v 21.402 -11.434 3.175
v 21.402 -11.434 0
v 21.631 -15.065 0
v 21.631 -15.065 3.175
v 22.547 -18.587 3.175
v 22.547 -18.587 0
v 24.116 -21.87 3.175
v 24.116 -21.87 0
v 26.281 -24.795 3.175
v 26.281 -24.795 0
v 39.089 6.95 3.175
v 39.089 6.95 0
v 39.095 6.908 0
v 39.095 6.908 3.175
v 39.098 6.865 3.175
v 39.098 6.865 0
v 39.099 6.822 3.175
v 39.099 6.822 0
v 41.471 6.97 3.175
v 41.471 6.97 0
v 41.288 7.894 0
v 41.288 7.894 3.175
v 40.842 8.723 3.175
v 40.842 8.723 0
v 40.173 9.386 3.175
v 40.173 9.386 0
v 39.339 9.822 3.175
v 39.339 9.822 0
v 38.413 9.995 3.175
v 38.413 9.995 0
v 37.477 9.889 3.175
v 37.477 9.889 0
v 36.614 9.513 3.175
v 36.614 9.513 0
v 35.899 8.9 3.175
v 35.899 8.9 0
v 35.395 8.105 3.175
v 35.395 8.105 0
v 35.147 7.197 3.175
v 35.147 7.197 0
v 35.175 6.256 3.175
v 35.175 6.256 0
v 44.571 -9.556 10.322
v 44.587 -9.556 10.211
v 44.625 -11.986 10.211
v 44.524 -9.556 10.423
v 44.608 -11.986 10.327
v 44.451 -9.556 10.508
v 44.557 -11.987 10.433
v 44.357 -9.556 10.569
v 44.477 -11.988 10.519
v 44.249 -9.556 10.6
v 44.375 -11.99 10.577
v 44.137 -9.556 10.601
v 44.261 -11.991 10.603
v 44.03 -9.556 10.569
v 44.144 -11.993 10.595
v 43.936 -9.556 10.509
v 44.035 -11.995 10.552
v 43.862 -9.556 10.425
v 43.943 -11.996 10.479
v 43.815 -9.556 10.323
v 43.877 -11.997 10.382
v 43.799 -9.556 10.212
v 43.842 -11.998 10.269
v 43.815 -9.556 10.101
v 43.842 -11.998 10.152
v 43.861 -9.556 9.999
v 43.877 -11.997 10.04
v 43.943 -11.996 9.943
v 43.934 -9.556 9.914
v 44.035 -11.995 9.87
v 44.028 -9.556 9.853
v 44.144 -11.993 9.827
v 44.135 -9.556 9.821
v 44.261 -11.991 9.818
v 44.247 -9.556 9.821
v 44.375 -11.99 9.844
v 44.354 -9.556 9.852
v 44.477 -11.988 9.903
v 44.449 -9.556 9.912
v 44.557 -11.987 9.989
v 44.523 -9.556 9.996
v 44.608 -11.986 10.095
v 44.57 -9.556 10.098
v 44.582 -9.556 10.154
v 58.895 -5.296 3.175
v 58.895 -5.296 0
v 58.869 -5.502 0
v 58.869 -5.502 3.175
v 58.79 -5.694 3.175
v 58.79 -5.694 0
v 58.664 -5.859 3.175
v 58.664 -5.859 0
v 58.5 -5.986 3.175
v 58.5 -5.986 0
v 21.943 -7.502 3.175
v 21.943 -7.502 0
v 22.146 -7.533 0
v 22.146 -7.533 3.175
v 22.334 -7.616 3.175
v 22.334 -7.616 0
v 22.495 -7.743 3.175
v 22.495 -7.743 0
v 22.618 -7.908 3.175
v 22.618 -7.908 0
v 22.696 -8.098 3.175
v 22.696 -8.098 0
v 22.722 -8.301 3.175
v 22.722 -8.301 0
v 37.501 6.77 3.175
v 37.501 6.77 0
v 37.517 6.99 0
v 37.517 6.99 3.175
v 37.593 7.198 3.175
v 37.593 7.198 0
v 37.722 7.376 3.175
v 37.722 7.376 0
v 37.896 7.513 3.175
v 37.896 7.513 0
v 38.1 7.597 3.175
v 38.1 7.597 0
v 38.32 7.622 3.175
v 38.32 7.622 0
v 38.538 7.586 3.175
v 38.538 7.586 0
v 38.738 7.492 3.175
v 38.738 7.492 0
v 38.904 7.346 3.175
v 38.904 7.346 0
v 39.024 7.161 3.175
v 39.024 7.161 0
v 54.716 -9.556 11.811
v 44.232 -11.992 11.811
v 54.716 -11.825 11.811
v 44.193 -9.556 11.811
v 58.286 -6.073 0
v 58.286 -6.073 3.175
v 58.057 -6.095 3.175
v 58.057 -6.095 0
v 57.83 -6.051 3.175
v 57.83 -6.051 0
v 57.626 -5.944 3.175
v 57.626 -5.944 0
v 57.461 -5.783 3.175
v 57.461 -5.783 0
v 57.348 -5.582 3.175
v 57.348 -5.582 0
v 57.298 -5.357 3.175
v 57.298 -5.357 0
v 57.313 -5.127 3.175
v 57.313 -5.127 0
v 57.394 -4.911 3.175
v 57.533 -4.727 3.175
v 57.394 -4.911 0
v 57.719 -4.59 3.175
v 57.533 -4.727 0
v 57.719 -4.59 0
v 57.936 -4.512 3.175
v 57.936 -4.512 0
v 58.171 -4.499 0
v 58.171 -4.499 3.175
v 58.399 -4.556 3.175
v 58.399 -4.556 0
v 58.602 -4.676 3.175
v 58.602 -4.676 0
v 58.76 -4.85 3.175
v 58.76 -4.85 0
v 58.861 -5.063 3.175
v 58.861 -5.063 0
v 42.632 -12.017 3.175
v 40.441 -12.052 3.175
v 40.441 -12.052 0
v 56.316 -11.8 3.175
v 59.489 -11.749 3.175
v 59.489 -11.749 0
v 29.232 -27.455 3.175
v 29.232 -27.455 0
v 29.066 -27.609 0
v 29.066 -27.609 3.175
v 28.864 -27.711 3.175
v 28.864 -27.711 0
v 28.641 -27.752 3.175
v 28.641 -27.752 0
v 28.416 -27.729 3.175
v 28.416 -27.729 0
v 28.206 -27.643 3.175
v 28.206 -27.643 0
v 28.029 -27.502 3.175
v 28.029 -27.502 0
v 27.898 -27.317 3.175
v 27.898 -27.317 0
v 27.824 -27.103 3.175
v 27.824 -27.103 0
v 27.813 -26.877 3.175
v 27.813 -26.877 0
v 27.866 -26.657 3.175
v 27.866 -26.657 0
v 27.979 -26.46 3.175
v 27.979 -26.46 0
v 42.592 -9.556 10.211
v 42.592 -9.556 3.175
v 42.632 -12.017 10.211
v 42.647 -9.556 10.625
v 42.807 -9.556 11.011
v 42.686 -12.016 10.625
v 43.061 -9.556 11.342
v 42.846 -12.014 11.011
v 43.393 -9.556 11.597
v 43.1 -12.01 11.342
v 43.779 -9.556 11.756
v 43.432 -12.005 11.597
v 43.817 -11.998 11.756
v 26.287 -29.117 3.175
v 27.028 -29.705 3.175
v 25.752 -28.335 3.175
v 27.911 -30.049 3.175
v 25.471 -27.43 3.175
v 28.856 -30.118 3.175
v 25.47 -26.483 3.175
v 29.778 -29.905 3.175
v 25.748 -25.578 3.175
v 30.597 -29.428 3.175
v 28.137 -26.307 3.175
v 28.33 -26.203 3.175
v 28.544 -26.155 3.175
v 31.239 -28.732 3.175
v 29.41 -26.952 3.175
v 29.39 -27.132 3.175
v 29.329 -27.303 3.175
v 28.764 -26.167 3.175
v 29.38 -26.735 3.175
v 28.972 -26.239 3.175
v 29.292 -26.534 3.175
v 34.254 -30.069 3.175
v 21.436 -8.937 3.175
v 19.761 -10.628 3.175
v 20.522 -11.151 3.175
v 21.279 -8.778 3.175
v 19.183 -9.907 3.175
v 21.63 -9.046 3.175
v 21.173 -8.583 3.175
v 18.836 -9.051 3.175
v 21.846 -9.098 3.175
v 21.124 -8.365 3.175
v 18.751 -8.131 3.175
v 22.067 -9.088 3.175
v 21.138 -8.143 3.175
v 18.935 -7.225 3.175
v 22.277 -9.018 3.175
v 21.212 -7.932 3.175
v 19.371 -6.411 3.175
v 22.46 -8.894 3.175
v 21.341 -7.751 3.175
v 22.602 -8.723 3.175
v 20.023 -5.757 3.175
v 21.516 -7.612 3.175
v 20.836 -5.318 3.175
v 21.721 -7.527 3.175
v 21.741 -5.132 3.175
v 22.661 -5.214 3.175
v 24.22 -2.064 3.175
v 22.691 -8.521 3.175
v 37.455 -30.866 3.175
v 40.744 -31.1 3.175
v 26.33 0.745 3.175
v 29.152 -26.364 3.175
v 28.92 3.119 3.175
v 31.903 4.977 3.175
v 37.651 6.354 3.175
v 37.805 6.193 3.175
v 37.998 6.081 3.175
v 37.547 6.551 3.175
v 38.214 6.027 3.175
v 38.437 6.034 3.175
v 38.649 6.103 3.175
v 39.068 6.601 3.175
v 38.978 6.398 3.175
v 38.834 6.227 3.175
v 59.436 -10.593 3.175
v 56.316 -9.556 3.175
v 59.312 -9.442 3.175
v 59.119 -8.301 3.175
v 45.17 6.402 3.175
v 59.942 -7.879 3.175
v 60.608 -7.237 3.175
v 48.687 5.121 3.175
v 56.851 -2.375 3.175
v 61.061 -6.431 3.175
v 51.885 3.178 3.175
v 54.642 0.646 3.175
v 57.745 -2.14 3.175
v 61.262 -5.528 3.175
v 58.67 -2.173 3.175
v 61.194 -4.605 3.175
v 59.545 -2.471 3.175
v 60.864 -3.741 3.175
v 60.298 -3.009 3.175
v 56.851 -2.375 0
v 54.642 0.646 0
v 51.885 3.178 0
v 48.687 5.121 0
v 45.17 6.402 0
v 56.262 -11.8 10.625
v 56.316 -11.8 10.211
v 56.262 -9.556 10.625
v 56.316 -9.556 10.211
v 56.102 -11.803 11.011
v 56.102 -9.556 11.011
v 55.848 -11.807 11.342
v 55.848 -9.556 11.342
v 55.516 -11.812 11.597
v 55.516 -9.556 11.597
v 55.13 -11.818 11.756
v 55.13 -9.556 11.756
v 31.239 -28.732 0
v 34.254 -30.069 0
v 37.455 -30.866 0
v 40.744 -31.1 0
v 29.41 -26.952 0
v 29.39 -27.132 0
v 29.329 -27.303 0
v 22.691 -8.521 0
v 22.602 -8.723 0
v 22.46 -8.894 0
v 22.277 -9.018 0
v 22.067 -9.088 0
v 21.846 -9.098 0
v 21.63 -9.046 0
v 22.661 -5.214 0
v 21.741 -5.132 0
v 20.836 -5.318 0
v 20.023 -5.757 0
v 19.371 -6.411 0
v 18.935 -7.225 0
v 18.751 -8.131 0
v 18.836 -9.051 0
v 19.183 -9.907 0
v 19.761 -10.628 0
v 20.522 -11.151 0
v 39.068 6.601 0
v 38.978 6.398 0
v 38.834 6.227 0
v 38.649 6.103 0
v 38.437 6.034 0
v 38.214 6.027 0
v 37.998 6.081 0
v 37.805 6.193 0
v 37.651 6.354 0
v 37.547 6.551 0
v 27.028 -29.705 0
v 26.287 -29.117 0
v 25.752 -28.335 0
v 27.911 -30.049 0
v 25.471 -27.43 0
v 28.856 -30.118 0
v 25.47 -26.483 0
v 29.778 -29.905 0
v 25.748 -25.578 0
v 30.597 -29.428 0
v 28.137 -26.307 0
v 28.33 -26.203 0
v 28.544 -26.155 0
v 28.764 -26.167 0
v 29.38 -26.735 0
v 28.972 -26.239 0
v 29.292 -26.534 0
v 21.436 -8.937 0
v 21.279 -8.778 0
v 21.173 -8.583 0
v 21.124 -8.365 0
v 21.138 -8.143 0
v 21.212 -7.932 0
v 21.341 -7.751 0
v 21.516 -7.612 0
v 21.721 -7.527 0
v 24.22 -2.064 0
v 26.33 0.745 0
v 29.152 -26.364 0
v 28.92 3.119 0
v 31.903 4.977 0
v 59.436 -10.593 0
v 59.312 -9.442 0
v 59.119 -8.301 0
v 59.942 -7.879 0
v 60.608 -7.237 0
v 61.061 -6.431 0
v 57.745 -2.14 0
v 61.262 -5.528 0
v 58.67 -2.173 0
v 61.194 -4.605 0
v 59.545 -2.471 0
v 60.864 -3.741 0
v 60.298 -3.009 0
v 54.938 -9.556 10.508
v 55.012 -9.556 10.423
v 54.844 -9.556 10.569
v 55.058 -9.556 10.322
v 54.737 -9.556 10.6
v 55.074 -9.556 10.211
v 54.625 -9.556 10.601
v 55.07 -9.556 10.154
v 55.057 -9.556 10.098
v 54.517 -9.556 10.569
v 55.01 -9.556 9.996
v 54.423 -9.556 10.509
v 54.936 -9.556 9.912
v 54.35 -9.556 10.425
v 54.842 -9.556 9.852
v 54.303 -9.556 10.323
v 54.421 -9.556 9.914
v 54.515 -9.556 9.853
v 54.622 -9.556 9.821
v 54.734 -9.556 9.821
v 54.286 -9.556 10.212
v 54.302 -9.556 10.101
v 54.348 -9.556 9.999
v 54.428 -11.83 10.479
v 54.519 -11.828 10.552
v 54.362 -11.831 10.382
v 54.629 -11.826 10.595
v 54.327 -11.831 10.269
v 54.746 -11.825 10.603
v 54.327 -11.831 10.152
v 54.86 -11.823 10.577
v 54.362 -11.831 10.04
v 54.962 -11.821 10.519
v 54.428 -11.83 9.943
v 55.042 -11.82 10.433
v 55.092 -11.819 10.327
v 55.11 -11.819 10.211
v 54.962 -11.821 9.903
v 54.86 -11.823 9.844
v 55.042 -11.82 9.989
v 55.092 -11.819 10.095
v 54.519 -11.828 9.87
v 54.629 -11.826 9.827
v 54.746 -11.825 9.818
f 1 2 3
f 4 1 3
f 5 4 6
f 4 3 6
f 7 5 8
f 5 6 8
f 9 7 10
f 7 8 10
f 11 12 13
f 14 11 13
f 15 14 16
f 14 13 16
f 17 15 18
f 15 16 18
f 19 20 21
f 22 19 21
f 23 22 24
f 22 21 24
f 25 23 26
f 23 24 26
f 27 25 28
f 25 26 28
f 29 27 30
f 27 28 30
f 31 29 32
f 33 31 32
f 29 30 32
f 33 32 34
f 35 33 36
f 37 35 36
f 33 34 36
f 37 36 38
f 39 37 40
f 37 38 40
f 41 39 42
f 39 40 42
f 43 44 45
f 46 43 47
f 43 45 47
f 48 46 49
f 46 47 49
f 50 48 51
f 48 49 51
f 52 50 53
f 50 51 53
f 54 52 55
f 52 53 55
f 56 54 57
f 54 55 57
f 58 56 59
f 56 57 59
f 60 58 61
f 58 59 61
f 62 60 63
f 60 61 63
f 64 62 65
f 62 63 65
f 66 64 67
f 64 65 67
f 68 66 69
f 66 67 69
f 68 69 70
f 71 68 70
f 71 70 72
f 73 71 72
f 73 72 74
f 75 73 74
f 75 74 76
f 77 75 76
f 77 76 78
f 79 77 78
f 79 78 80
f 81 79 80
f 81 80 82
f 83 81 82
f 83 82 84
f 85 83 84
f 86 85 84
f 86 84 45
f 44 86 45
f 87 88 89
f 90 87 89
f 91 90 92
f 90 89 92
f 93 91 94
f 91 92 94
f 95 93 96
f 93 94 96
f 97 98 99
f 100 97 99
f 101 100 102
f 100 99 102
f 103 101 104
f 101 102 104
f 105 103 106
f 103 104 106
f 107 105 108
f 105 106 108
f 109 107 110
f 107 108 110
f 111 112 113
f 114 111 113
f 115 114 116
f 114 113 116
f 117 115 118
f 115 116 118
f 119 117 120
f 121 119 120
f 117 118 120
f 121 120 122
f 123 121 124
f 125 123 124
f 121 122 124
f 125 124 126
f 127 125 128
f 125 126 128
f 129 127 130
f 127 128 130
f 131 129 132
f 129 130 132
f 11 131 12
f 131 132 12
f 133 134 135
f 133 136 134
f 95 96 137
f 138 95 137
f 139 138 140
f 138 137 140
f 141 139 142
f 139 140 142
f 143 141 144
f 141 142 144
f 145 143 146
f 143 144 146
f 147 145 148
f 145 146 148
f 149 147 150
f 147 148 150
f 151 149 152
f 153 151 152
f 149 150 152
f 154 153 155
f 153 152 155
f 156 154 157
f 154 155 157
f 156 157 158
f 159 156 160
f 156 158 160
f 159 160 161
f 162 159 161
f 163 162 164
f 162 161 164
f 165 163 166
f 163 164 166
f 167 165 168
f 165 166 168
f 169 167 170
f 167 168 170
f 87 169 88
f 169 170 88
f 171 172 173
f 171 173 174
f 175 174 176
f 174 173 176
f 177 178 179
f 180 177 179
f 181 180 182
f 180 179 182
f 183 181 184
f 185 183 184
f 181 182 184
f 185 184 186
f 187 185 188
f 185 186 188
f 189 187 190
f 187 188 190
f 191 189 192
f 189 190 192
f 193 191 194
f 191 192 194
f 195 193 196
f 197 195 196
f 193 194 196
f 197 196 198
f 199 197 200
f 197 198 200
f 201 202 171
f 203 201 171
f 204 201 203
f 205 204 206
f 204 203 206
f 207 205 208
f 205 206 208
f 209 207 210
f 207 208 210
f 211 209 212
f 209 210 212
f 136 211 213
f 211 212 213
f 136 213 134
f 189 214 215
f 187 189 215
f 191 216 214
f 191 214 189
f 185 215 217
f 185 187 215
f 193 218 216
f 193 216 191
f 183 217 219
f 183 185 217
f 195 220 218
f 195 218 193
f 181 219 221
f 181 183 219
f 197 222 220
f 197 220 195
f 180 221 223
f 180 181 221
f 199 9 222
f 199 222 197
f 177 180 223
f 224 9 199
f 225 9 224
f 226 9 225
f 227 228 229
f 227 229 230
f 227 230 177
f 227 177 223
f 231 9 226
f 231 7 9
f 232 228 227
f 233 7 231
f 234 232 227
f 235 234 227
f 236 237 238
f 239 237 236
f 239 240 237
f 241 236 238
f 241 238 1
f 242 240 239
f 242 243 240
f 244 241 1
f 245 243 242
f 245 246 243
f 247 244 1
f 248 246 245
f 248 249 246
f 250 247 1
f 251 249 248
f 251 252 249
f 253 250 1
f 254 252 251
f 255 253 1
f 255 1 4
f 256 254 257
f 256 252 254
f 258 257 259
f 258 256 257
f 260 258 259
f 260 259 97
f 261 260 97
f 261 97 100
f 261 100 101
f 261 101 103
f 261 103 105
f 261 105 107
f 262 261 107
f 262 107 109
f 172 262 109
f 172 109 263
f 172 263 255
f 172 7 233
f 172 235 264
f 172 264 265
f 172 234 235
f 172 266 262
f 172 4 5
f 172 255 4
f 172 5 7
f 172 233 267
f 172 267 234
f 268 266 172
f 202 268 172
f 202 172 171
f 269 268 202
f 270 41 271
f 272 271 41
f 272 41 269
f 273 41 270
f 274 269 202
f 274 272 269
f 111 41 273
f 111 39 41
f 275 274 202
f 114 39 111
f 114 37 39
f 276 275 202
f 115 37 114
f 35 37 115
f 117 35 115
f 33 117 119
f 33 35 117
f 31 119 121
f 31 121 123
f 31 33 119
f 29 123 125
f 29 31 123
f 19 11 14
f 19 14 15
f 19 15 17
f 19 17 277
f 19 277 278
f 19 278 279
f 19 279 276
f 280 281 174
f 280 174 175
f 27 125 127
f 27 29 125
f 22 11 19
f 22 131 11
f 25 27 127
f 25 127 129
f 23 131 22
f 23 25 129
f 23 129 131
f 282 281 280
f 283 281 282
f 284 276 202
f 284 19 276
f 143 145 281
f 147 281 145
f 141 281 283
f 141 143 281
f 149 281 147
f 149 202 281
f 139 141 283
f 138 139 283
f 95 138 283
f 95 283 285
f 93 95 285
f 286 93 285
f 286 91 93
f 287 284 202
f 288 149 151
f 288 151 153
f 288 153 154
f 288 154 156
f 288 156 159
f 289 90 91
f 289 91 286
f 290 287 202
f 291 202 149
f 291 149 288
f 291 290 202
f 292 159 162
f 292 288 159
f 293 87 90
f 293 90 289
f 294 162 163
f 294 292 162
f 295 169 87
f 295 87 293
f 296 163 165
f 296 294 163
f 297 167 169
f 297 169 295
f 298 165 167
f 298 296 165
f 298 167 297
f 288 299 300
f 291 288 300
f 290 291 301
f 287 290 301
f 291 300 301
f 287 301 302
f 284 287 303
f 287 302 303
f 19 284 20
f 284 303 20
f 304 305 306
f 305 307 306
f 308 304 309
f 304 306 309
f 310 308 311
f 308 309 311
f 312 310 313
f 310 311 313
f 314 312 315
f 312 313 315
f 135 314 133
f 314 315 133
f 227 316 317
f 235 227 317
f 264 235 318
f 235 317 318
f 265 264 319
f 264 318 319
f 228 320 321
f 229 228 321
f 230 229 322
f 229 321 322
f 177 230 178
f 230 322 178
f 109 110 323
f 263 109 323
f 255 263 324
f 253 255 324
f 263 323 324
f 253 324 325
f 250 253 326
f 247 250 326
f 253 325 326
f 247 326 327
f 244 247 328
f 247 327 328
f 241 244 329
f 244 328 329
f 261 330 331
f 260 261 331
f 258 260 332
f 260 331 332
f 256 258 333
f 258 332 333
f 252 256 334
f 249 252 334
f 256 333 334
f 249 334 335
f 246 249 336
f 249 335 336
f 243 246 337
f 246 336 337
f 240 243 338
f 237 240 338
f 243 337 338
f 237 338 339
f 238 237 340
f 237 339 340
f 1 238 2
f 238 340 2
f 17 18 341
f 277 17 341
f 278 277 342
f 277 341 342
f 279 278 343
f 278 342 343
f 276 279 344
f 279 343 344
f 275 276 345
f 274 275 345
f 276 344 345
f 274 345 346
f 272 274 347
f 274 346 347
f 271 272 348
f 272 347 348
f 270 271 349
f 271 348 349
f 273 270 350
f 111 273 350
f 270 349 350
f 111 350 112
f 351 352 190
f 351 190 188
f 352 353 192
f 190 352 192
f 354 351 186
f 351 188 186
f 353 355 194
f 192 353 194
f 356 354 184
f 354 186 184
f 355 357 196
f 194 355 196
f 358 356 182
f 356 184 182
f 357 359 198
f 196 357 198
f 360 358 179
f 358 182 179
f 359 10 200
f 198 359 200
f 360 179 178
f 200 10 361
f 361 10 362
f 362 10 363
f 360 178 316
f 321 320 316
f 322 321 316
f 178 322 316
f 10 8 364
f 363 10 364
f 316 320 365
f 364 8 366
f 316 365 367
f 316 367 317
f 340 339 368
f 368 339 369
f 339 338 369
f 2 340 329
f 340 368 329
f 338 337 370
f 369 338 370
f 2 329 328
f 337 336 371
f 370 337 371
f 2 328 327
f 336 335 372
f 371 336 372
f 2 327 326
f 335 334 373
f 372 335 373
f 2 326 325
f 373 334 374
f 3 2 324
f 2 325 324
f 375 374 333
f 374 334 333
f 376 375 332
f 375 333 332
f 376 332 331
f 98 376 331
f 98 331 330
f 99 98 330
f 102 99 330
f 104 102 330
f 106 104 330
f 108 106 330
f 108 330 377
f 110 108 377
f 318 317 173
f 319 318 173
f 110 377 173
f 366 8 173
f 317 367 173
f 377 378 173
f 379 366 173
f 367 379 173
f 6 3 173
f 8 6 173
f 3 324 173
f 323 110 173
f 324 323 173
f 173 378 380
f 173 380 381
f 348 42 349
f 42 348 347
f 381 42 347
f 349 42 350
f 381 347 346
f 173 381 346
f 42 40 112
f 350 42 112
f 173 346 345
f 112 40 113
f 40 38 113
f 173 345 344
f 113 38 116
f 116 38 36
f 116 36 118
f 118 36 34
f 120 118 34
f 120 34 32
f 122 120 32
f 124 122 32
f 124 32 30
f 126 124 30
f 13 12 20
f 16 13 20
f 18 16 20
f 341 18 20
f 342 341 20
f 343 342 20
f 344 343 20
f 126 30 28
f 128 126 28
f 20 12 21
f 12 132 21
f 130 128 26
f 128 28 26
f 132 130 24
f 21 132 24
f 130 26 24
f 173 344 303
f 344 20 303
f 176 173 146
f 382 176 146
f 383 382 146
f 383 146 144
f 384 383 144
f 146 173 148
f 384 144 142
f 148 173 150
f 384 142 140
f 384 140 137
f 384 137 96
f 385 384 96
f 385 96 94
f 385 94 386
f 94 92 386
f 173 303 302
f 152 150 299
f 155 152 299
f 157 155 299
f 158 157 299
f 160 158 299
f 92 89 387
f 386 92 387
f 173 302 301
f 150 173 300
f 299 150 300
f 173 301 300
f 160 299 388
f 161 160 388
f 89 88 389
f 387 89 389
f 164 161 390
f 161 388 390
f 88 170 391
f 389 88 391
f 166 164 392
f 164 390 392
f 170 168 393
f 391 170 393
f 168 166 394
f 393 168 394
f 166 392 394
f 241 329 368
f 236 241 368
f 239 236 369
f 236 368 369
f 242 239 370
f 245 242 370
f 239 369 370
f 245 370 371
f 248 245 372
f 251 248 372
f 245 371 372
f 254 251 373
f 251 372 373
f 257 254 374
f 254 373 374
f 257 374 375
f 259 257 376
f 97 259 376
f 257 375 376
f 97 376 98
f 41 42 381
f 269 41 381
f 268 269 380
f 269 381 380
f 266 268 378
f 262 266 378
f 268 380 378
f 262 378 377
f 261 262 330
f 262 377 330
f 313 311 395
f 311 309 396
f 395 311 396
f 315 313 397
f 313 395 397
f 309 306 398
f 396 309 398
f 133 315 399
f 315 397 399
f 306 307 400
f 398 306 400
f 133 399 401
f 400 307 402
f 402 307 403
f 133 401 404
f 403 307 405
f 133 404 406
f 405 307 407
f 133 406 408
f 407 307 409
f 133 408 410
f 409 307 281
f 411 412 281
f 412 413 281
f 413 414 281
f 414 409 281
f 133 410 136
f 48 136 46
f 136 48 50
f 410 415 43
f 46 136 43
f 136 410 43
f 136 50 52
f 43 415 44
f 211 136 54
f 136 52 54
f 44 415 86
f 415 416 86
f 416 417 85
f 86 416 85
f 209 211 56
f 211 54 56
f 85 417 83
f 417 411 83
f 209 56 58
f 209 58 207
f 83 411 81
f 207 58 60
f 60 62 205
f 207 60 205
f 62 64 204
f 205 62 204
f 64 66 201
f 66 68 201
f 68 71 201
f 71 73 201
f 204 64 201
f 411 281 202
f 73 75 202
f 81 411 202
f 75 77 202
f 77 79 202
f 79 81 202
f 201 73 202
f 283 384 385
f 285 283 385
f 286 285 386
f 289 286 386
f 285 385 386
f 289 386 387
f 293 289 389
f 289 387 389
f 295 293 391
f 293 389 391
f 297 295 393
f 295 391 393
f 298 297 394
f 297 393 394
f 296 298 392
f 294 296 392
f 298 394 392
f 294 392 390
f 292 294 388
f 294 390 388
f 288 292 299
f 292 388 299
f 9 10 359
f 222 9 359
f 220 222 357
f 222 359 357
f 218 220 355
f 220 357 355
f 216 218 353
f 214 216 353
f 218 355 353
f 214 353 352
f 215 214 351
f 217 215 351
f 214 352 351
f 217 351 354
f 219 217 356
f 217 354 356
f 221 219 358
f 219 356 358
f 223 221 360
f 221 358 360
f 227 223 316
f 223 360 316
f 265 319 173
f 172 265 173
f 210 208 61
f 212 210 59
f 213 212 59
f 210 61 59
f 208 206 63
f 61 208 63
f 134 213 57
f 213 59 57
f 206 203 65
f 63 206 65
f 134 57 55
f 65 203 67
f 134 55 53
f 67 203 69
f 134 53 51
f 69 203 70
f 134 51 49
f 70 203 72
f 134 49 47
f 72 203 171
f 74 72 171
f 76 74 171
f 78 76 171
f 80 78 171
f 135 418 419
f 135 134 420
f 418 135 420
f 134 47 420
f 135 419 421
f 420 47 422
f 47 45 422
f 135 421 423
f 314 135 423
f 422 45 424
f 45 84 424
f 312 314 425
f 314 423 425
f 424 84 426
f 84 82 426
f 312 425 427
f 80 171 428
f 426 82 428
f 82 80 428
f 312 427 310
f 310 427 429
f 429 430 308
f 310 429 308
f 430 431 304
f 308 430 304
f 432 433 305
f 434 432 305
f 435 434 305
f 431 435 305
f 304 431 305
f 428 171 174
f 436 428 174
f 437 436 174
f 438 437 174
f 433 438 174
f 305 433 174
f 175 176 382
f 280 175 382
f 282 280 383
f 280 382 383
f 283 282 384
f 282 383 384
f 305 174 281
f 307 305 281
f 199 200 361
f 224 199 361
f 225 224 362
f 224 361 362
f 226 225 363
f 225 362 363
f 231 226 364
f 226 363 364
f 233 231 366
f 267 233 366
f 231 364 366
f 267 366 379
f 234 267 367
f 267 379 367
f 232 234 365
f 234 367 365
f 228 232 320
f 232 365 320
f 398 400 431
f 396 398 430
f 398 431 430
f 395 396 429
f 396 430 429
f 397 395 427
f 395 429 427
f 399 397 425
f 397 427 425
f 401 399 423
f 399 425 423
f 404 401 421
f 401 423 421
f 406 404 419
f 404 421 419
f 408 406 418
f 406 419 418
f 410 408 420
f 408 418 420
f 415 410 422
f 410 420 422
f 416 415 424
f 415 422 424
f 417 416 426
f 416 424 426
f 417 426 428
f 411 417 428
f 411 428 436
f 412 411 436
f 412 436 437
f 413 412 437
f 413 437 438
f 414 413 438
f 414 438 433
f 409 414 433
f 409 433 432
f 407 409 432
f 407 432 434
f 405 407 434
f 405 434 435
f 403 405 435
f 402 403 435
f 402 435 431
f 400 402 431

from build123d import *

# Parameters (mm, degrees)
F1_DEPTH = 3.175
F3_DEPTH = 8.636
F4_R     = 1.6002
F5_R     = 0.3937
F6_DEPTH = 25.4
F7_DEPTH = 25.4


with BuildPart() as f1:
    # F0 (on Top) → F1 (new body)
    with BuildSketch(Plane.XY):
        with BuildLine():
            ThreePointArc((31.2392285465, -28.7320576953), (35.8370397612, -30.5372732521), (40.7444173623, -31.0996932487))
            Line((40.7444173623, -31.0996932487), (40.4414878789, -12.0521019645))
            Line((40.4414878789, -12.0521019645), (59.489079163, -11.7491724811))
            ThreePointArc((59.489079163, -11.7491724811), (59.3824551279, -10.0168477616), (59.1186092237, -8.3014169243))
            ThreePointArc((59.1186092237, -8.3014169243), (58.8457012348, -7.1340301115), (58.4999035926, -5.9861212597))
            ThreePointArc((58.4999035926, -5.9861212597), (57.3481289048, -5.5817963761), (57.9356764569, -4.5118190787))
            ThreePointArc((57.9356764569, -4.5118190787), (57.4267405613, -3.4263445302), (56.8505347882, -2.3750321845))
            ThreePointArc((56.8505347882, -2.3750321845), (50.3338026609, 4.2280887055), (41.4709261237, 6.9700629202))
            ThreePointArc((41.4709261237, 6.9700629202), (40.2797629673, 6.9972115416), (39.0892324485, 6.949842811))
            ThreePointArc((39.0892324485, 6.949842811), (39.096904661, 6.8862640952), (39.0994675382, 6.822275443))
            ThreePointArc((39.0994675382, 6.822275443), (38.3257250063, 6.0226097042), (37.5010041114, 6.7695891182))
            ThreePointArc((37.5010041114, 6.7695891182), (36.33013815, 6.5489545487), (35.1753550199, 6.2555561247))
            ThreePointArc((35.1753550199, 6.2555561247), (27.5701803077, 1.991827023), (22.66118966, -5.2137179999))
            ThreePointArc((22.66118966, -5.2137179999), (22.2660417046, -6.3463455408), (21.9429633319, -7.5015976424))
            ThreePointArc((21.9429633319, -7.5015976424), (22.4949706136, -7.7432037883), (22.7218707315, -8.3014169243))
            ThreePointArc((22.7218707315, -8.3014169243), (22.3727631285, -8.9622995673), (21.6300925341, -9.0464564127))
            ThreePointArc((21.6300925341, -9.0464564127), (21.4782165965, -10.2363810963), (21.4015341389, -11.4335055067))
            ThreePointArc((21.4015341389, -11.4335055067), (22.5472730496, -18.5865931952), (26.2806968621, -24.7947271956))
            ThreePointArc((26.2806968621, -24.7947271956), (27.1038904808, -25.6539766753), (27.9791241647, -26.4601549439))
            ThreePointArc((27.9791241647, -26.4601549439), (28.8701686575, -26.1957695514), (29.4100136292, -26.9523588259))
            ThreePointArc((29.4100136292, -26.9523588259), (29.3642656384, -27.2190291398), (29.2322532085, -27.4552041879))
            ThreePointArc((29.2322532085, -27.4552041879), (30.2157917864, -28.1249871885), (31.2392285465, -28.7320576953))
        make_face()
        with BuildLine():
            ThreePointArc((26.2806968621, -24.7947271956), (26.6355383886, -29.438815624), (31.2392285465, -28.7320576953))
            ThreePointArc((31.2392285465, -28.7320576953), (30.2157917864, -28.1249871885), (29.2322532085, -27.4552041879))
            ThreePointArc((29.2322532085, -27.4552041879), (28.1123710686, -27.578945939), (27.9791241647, -26.4601549439))
            ThreePointArc((27.9791241647, -26.4601549439), (27.1038904808, -25.6539766753), (26.2806968621, -24.7947271956))
        make_face()
        with BuildLine():
            ThreePointArc((58.4999035926, -5.9861212597), (58.8457012348, -7.1340301115), (59.1186092237, -8.3014169243))
            ThreePointArc((59.1186092237, -8.3014169243), (61.0606385443, -4.1609894973), (56.8505347882, -2.3750321845))
            ThreePointArc((56.8505347882, -2.3750321845), (57.4267405613, -3.4263445302), (57.9356764569, -4.5118190787))
            ThreePointArc((57.9356764569, -4.5118190787), (58.6015298758, -4.6761681541), (58.895475254, -5.2958192727))
            ThreePointArc((58.895475254, -5.2958192727), (58.7895737608, -5.6936238015), (58.4999035926, -5.9861212597))
        make_face()
        with BuildLine():
            ThreePointArc((22.66118966, -5.2137179999), (18.809946607, -7.6711982175), (21.4015341389, -11.4335055067))
            ThreePointArc((21.4015341389, -11.4335055067), (21.4782165965, -10.2363810963), (21.6300925341, -9.0464564127))
            ThreePointArc((21.6300925341, -9.0464564127), (21.1375910521, -8.1426018102), (21.9429633319, -7.5015976424))
            ThreePointArc((21.9429633319, -7.5015976424), (22.2660417046, -6.3463455408), (22.66118966, -5.2137179999))
        make_face()
        with BuildLine():
            ThreePointArc((39.0892324485, 6.949842811), (40.2797629673, 6.9972115416), (41.4709261237, 6.9700629202))
            ThreePointArc((41.4709261237, 6.9700629202), (37.9413240389, 9.9770226362), (35.1753550199, 6.2555561247))
            ThreePointArc((35.1753550199, 6.2555561247), (36.33013815, 6.5489545487), (37.5010041114, 6.7695891182))
            ThreePointArc((37.5010041114, 6.7695891182), (38.2091405764, 7.6172717357), (39.0892324485, 6.949842811))
        make_face()
    extrude(amount=F1_DEPTH)

    # F2 (on face) → F3 (join)
    with BuildSketch(Plane.XY.offset(3.175)):
        Polygon((42.631557275, -12.0172714927), (56.3164878789, -11.7996288052), (56.3164878789, -9.556004395), (42.5924137235, -9.556004395), align=None)
    extrude(amount=F3_DEPTH)

    # F4
    f4_edges = [f1.edges().sort_by_distance(p)[0] for p in [
        (42.611985, -10.786638, 11.811),
        (56.316488, -10.677817, 11.811),
    ]]
    fillet(f4_edges, radius=F4_R)

    # F5 (on face) → F6 (cut)
    with BuildSketch(Plane(origin=(0.2018523454, -12.6920659276, 0), x_dir=(0.9998735582, 0.0159018102, 0), z_dir=(0.0159018102, -0.9998735582, 0))):
        with Locations((44.0352704953, 10.2108)):
            Circle(F5_R)
    extrude(amount=-F6_DEPTH, mode=Mode.SUBTRACT)

    # F5 (on face) → F7 (cut)
    with BuildSketch(Plane(origin=(0.2018523454, -12.6920659276, 0), x_dir=(0.9998735582, 0.0159018102, 0), z_dir=(0.0159018102, -0.9998735582, 0))):
        with Locations((44.0352704953, 10.2108)):
            Circle(F5_R)
        with Locations((54.5213293072, 10.2108)):
            Circle(F5_R)
    extrude(amount=-F7_DEPTH, mode=Mode.SUBTRACT)


solid = f1.part
